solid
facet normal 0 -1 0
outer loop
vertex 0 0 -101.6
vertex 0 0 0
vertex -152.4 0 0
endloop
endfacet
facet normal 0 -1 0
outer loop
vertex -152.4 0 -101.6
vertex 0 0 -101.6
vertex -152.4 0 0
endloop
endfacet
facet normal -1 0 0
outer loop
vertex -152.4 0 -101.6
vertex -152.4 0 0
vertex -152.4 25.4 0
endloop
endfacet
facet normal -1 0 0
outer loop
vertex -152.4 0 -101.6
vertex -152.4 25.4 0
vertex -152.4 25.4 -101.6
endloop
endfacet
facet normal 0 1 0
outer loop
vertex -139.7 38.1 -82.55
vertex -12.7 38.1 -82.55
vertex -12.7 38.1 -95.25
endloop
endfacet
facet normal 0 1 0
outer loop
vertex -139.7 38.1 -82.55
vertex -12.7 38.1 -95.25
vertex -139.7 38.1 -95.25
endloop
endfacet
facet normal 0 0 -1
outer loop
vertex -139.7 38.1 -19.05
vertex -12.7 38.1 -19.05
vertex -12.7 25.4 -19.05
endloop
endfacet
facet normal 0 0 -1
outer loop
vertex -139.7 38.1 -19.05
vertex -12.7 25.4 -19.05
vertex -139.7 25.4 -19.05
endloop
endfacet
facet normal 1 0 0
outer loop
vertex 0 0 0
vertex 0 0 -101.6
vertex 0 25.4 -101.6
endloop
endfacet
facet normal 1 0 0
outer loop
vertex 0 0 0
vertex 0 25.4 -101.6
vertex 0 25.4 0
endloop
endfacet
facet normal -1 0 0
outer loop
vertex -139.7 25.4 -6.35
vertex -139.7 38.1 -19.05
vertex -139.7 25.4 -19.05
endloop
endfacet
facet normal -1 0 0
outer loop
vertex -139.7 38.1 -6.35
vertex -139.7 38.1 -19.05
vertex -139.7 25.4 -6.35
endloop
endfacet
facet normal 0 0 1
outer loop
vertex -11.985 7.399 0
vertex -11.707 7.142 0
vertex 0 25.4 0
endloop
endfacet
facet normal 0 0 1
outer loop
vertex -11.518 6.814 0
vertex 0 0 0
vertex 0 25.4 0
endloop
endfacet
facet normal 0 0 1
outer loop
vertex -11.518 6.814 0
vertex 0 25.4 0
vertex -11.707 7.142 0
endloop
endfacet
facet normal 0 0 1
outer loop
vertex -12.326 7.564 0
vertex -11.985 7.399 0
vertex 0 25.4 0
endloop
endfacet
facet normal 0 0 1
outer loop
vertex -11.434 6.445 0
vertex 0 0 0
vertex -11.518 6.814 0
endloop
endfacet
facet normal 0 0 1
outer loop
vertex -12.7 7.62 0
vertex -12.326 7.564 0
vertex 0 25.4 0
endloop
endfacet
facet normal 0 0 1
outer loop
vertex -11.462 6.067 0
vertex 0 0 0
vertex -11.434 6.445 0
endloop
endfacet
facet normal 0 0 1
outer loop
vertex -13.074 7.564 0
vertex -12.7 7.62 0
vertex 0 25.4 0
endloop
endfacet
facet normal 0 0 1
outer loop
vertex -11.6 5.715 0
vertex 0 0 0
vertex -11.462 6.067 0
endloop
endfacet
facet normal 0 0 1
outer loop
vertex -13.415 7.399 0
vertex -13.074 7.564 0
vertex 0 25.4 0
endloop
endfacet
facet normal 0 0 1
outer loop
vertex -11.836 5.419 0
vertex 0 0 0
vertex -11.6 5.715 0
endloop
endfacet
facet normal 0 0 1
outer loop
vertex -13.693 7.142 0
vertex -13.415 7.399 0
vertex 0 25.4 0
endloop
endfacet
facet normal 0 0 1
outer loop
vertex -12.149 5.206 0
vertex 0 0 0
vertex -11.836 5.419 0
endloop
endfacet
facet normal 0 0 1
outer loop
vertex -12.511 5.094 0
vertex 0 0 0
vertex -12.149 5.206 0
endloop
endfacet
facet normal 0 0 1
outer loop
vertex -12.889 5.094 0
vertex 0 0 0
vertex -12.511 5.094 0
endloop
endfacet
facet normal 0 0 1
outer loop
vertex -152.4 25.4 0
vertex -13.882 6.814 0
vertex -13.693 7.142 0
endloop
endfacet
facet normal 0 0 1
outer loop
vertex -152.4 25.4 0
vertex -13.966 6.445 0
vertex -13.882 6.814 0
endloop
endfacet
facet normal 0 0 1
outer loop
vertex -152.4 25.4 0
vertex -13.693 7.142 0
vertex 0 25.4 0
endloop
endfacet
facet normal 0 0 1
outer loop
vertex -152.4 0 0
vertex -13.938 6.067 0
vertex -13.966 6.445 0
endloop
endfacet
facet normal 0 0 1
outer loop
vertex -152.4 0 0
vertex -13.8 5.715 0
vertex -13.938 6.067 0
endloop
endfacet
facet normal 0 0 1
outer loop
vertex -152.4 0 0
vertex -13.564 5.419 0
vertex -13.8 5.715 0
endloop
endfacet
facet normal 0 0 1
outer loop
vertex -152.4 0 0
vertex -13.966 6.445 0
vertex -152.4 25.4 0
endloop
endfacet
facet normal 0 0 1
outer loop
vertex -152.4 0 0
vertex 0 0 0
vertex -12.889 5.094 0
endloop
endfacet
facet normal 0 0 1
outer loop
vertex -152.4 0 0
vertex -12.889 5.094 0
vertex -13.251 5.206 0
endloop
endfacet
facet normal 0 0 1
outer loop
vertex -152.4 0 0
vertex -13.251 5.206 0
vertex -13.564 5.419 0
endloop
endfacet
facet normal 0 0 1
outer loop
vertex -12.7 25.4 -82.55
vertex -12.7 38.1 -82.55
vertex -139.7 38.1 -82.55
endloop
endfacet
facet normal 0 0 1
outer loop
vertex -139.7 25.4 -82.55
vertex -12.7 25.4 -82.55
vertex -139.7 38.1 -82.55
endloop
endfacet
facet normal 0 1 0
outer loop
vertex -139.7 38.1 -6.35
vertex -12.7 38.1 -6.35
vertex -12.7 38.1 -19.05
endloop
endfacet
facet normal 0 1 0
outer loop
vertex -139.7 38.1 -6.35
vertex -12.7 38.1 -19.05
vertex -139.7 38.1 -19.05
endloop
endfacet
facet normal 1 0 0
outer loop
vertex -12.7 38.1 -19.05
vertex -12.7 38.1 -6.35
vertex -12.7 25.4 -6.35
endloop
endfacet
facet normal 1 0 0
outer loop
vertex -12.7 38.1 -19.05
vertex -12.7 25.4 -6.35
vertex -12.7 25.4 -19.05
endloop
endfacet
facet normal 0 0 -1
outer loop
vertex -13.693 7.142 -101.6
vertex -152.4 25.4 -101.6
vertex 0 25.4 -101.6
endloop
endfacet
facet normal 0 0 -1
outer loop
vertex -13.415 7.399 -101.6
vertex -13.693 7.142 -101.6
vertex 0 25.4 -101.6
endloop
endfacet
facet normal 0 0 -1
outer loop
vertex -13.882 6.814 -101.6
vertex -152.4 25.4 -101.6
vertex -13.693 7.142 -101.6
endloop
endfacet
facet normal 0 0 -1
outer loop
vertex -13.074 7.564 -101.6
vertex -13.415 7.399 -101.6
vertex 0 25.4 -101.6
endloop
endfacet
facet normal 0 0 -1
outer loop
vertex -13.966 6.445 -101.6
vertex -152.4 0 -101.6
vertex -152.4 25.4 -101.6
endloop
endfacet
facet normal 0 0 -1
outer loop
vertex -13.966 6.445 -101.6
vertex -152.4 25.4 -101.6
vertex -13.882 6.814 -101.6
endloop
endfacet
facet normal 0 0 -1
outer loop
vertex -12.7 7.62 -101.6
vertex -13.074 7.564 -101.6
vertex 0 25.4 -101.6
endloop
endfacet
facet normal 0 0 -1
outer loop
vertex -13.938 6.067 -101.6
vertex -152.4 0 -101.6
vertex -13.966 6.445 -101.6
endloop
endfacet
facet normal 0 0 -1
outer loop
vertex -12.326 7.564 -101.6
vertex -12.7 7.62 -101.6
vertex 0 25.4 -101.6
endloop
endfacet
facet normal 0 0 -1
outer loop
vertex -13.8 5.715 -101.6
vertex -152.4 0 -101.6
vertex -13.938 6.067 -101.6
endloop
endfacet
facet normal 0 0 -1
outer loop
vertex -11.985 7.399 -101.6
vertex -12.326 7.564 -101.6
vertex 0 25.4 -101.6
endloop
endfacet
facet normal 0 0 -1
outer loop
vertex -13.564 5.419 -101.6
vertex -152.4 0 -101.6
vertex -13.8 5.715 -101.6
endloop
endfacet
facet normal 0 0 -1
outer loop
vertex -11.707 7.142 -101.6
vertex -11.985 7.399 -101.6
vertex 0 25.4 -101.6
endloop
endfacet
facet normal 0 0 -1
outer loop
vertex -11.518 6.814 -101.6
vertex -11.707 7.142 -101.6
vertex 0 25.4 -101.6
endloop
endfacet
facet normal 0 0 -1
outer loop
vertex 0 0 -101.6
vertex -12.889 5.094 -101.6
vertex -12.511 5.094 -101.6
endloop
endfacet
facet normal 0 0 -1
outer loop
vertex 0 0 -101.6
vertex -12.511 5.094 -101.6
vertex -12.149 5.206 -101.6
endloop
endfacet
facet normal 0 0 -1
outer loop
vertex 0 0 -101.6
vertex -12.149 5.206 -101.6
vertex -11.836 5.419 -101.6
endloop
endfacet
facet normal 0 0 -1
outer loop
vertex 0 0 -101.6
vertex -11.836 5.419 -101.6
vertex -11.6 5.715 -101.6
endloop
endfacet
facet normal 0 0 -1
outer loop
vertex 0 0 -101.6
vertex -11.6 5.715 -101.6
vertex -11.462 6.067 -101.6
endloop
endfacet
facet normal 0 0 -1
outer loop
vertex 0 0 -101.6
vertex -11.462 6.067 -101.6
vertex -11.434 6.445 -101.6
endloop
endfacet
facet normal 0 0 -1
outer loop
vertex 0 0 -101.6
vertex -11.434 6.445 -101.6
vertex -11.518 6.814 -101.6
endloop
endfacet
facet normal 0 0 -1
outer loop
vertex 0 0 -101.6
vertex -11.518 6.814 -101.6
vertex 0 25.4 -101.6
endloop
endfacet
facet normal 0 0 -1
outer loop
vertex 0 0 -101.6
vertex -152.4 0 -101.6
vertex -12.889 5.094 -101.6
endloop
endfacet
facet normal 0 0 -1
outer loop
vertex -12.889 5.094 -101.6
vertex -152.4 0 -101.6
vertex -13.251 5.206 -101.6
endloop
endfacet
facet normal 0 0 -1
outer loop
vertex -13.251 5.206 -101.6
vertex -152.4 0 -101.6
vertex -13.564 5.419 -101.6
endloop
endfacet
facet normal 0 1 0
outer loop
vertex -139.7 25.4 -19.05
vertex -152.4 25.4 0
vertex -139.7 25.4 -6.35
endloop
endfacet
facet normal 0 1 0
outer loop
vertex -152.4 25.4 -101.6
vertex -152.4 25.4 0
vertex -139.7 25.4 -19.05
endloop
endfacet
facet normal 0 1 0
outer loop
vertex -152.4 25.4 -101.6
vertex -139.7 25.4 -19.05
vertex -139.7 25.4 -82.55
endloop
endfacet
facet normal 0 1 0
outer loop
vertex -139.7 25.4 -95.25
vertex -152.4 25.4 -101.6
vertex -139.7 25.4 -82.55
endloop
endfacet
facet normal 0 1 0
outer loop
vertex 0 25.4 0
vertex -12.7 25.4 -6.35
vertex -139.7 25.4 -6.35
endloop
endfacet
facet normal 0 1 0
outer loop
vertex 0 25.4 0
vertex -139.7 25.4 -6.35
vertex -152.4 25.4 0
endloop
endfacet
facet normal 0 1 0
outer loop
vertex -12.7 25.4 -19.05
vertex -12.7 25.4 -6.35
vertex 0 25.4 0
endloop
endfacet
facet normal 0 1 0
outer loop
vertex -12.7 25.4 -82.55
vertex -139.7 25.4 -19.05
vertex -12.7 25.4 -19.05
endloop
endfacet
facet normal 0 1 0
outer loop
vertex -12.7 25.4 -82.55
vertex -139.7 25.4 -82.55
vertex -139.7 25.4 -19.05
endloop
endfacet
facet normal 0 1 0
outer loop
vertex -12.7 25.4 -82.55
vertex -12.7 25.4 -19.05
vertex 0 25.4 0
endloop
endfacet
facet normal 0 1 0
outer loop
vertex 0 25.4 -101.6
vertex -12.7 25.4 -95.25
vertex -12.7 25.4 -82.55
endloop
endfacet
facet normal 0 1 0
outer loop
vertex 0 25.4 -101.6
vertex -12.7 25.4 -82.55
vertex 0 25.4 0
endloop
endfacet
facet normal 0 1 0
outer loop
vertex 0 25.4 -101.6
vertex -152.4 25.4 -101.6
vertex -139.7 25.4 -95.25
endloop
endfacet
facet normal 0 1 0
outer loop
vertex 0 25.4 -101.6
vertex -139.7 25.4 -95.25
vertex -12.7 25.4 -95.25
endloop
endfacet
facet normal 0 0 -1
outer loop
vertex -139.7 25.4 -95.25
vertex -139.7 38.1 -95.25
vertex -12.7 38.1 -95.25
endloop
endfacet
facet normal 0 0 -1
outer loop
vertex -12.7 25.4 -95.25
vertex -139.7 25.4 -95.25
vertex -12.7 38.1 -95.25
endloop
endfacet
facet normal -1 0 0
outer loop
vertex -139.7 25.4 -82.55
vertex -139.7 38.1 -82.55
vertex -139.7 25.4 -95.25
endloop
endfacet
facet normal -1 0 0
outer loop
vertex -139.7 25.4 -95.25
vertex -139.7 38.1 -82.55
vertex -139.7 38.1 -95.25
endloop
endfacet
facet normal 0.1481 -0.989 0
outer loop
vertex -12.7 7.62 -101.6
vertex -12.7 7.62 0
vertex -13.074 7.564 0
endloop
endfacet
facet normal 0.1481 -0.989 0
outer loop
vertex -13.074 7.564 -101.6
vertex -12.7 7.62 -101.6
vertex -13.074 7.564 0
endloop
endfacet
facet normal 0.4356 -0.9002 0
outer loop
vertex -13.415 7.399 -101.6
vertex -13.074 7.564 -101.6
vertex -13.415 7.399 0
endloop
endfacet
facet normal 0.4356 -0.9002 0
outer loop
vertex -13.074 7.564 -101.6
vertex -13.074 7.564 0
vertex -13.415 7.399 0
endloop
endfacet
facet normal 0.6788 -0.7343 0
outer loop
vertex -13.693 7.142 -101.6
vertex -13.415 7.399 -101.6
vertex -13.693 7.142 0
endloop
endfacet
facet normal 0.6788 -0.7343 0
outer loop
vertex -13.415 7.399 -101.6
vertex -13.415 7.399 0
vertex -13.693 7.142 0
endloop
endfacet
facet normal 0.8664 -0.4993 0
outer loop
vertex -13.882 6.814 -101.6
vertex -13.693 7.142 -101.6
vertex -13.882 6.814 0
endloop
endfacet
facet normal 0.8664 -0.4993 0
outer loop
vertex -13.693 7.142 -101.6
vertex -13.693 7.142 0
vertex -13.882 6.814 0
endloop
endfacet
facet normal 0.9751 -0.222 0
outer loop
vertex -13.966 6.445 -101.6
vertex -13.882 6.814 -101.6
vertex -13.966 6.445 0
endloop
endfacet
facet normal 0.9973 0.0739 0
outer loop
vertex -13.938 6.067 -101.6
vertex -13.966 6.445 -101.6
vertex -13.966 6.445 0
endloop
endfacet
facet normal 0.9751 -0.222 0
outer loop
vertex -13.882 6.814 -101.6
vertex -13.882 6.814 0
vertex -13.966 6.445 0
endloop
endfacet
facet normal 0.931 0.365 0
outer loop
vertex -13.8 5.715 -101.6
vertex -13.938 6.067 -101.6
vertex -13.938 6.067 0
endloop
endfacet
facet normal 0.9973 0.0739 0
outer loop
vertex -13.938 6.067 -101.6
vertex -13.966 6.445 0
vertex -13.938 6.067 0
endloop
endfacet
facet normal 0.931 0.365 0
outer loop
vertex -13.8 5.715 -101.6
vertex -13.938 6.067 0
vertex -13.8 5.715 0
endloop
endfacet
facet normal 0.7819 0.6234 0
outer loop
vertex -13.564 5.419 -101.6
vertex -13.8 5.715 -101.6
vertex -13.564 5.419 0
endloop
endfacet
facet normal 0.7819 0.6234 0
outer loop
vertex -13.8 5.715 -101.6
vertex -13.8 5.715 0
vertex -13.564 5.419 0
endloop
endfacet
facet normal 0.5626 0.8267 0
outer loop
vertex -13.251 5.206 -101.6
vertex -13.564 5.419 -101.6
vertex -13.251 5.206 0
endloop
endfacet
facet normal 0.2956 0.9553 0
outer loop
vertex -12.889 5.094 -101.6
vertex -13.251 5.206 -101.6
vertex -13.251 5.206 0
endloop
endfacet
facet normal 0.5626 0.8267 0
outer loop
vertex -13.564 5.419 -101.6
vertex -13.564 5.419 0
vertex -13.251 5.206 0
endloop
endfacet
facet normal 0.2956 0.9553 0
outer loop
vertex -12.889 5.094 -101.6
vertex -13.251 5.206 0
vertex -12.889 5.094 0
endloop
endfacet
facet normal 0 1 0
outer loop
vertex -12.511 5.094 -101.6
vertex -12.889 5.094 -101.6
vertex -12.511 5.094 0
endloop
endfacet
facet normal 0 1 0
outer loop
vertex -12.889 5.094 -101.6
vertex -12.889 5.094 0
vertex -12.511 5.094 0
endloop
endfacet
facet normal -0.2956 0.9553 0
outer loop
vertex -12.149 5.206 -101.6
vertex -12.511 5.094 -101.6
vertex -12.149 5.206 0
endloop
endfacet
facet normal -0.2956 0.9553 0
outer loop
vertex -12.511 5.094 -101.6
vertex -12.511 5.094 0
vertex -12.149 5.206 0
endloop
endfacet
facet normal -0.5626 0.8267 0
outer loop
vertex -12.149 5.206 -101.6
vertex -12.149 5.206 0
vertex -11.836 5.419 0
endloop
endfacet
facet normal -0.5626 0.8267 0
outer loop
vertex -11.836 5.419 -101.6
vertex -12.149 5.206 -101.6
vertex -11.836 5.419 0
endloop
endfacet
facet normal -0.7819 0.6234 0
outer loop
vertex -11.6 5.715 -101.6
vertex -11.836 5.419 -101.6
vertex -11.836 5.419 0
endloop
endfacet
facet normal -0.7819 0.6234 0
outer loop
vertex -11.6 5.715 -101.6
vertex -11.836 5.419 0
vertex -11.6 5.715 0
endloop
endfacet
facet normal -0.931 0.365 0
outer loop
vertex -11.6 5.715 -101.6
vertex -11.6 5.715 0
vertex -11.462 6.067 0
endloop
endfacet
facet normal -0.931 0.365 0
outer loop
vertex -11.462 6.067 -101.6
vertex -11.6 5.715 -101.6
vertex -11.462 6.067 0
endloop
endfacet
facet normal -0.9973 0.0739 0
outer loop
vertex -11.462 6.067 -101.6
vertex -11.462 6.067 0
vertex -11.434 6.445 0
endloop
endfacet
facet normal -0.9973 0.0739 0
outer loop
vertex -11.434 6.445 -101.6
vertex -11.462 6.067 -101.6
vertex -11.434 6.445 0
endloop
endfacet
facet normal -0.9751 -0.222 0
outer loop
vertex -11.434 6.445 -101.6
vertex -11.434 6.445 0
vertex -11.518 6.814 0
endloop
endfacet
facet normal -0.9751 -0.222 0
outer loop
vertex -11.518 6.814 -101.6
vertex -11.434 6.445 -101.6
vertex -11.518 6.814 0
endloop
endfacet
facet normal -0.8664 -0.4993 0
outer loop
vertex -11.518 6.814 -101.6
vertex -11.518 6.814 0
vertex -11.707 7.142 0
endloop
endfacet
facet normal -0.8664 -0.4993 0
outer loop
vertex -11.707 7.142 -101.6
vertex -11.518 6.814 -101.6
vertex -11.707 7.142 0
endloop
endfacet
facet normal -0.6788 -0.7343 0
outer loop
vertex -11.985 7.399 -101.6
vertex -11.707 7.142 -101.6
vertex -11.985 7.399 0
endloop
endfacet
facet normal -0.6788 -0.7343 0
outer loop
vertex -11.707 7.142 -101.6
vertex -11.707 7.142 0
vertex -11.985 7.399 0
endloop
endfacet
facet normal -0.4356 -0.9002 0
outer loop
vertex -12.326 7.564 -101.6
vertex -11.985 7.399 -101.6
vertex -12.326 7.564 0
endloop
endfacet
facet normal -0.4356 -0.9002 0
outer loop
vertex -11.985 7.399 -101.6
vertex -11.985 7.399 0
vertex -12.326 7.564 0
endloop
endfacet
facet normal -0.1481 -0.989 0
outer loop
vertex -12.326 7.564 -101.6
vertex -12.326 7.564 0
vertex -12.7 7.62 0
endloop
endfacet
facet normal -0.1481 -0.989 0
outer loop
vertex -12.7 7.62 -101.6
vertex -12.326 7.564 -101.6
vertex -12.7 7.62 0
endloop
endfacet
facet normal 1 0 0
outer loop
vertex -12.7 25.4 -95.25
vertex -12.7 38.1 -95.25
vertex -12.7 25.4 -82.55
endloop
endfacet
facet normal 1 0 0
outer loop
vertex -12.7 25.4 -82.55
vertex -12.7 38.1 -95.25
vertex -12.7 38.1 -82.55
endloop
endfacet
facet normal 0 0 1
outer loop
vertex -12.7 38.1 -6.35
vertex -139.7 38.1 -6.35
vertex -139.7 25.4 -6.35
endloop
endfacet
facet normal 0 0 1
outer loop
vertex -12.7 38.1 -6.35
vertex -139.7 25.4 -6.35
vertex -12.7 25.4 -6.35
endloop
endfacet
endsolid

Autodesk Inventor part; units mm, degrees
ref_plane "YZ Plane" through (0, 0, 0) normal (1, 0, 0) x (0, 1, 0)
ref_plane "XZ Plane" through (0, 0, 0) normal (0, 1, 0) x (-1, 0, 0)
sketch "Sketch1" plane through (0, 0, 0) normal (0, 1, 0) x (-1, 0, 0)
  line L0 (0, 0) -> (152.4, 0)
  line L1 (152.4, 0) -> (152.4, -101.6)
  line L2 (152.4, -101.6) -> (0, -101.6)
  line L3 (0, -101.6) -> (0, 0)
  dimension "d0" = 152.4
  dimension "d1" = 101.6
extrude "Extrusion1" add sketch "Sketch1" along normal blind 38.1
ref_plane "Work Plane1" through (-152.4, 0, -50.8) normal (0, 0, 1) x (1, 0, 0)
sketch "Sketch3" plane through (0, 38.1, 0) normal (0, 1, 0) x (1, 0, 0)
  line L0 (-139.7, 95.25) -> (-12.7, 95.25)
  line L1 (-12.7, 95.25) -> (-12.7, 82.55)
  line L2 (-12.7, 82.55) -> (-139.7, 82.55)
  line L3 (-139.7, 82.55) -> (-139.7, 95.25)
  line L4 (0, 101.6) -> (-152.4, 101.6) projected
  line L5 (0, 0) -> (0, 101.6) projected
  line L6 (-152.4, 101.6) -> (-152.4, 0) projected
  line L7 (30.48, 50.8) -> (-182.88, 50.8) projected
  line L8 (-139.7, 6.35) -> (-12.7, 6.35)
  line L9 (-12.7, 6.35) -> (-12.7, 19.05)
  line L10 (-12.7, 19.05) -> (-139.7, 19.05)
  line L11 (-139.7, 19.05) -> (-139.7, 6.35)
  line L12 (0, 101.6) -> (-152.4, 101.6)
  line L13 (-152.4, 101.6) -> (-152.4, 0)
  line L14 (-152.4, 0) -> (0, 0)
  line L15 (0, 0) -> (0, 101.6)
  dimension "d12" = 6.35
  dimension "d13" = 12.7
  dimension "d14" = 12.7
  dimension "d15" = 12.7
extrude "Extrusion3" cut sketch "Sketch3" against normal blind 12.7
sketch "Sketch4" plane through (0, 0, -101.6) normal (0, 0, -1) x (-1, 0, 0)
  line L0 (0, 0) -> (0, 25.4) projected
  line L1 (152.4, 0) -> (0, 0) projected
  point P0 (12.7, 6.35)
  dimension "d18" = 12.7
  dimension "d19" = 6.35
hole "Hole1" at (-12.7, 6.35, -101.6) direction (0, 0, 1) diameter 2.54 end through all
properties part number "BS #3"
